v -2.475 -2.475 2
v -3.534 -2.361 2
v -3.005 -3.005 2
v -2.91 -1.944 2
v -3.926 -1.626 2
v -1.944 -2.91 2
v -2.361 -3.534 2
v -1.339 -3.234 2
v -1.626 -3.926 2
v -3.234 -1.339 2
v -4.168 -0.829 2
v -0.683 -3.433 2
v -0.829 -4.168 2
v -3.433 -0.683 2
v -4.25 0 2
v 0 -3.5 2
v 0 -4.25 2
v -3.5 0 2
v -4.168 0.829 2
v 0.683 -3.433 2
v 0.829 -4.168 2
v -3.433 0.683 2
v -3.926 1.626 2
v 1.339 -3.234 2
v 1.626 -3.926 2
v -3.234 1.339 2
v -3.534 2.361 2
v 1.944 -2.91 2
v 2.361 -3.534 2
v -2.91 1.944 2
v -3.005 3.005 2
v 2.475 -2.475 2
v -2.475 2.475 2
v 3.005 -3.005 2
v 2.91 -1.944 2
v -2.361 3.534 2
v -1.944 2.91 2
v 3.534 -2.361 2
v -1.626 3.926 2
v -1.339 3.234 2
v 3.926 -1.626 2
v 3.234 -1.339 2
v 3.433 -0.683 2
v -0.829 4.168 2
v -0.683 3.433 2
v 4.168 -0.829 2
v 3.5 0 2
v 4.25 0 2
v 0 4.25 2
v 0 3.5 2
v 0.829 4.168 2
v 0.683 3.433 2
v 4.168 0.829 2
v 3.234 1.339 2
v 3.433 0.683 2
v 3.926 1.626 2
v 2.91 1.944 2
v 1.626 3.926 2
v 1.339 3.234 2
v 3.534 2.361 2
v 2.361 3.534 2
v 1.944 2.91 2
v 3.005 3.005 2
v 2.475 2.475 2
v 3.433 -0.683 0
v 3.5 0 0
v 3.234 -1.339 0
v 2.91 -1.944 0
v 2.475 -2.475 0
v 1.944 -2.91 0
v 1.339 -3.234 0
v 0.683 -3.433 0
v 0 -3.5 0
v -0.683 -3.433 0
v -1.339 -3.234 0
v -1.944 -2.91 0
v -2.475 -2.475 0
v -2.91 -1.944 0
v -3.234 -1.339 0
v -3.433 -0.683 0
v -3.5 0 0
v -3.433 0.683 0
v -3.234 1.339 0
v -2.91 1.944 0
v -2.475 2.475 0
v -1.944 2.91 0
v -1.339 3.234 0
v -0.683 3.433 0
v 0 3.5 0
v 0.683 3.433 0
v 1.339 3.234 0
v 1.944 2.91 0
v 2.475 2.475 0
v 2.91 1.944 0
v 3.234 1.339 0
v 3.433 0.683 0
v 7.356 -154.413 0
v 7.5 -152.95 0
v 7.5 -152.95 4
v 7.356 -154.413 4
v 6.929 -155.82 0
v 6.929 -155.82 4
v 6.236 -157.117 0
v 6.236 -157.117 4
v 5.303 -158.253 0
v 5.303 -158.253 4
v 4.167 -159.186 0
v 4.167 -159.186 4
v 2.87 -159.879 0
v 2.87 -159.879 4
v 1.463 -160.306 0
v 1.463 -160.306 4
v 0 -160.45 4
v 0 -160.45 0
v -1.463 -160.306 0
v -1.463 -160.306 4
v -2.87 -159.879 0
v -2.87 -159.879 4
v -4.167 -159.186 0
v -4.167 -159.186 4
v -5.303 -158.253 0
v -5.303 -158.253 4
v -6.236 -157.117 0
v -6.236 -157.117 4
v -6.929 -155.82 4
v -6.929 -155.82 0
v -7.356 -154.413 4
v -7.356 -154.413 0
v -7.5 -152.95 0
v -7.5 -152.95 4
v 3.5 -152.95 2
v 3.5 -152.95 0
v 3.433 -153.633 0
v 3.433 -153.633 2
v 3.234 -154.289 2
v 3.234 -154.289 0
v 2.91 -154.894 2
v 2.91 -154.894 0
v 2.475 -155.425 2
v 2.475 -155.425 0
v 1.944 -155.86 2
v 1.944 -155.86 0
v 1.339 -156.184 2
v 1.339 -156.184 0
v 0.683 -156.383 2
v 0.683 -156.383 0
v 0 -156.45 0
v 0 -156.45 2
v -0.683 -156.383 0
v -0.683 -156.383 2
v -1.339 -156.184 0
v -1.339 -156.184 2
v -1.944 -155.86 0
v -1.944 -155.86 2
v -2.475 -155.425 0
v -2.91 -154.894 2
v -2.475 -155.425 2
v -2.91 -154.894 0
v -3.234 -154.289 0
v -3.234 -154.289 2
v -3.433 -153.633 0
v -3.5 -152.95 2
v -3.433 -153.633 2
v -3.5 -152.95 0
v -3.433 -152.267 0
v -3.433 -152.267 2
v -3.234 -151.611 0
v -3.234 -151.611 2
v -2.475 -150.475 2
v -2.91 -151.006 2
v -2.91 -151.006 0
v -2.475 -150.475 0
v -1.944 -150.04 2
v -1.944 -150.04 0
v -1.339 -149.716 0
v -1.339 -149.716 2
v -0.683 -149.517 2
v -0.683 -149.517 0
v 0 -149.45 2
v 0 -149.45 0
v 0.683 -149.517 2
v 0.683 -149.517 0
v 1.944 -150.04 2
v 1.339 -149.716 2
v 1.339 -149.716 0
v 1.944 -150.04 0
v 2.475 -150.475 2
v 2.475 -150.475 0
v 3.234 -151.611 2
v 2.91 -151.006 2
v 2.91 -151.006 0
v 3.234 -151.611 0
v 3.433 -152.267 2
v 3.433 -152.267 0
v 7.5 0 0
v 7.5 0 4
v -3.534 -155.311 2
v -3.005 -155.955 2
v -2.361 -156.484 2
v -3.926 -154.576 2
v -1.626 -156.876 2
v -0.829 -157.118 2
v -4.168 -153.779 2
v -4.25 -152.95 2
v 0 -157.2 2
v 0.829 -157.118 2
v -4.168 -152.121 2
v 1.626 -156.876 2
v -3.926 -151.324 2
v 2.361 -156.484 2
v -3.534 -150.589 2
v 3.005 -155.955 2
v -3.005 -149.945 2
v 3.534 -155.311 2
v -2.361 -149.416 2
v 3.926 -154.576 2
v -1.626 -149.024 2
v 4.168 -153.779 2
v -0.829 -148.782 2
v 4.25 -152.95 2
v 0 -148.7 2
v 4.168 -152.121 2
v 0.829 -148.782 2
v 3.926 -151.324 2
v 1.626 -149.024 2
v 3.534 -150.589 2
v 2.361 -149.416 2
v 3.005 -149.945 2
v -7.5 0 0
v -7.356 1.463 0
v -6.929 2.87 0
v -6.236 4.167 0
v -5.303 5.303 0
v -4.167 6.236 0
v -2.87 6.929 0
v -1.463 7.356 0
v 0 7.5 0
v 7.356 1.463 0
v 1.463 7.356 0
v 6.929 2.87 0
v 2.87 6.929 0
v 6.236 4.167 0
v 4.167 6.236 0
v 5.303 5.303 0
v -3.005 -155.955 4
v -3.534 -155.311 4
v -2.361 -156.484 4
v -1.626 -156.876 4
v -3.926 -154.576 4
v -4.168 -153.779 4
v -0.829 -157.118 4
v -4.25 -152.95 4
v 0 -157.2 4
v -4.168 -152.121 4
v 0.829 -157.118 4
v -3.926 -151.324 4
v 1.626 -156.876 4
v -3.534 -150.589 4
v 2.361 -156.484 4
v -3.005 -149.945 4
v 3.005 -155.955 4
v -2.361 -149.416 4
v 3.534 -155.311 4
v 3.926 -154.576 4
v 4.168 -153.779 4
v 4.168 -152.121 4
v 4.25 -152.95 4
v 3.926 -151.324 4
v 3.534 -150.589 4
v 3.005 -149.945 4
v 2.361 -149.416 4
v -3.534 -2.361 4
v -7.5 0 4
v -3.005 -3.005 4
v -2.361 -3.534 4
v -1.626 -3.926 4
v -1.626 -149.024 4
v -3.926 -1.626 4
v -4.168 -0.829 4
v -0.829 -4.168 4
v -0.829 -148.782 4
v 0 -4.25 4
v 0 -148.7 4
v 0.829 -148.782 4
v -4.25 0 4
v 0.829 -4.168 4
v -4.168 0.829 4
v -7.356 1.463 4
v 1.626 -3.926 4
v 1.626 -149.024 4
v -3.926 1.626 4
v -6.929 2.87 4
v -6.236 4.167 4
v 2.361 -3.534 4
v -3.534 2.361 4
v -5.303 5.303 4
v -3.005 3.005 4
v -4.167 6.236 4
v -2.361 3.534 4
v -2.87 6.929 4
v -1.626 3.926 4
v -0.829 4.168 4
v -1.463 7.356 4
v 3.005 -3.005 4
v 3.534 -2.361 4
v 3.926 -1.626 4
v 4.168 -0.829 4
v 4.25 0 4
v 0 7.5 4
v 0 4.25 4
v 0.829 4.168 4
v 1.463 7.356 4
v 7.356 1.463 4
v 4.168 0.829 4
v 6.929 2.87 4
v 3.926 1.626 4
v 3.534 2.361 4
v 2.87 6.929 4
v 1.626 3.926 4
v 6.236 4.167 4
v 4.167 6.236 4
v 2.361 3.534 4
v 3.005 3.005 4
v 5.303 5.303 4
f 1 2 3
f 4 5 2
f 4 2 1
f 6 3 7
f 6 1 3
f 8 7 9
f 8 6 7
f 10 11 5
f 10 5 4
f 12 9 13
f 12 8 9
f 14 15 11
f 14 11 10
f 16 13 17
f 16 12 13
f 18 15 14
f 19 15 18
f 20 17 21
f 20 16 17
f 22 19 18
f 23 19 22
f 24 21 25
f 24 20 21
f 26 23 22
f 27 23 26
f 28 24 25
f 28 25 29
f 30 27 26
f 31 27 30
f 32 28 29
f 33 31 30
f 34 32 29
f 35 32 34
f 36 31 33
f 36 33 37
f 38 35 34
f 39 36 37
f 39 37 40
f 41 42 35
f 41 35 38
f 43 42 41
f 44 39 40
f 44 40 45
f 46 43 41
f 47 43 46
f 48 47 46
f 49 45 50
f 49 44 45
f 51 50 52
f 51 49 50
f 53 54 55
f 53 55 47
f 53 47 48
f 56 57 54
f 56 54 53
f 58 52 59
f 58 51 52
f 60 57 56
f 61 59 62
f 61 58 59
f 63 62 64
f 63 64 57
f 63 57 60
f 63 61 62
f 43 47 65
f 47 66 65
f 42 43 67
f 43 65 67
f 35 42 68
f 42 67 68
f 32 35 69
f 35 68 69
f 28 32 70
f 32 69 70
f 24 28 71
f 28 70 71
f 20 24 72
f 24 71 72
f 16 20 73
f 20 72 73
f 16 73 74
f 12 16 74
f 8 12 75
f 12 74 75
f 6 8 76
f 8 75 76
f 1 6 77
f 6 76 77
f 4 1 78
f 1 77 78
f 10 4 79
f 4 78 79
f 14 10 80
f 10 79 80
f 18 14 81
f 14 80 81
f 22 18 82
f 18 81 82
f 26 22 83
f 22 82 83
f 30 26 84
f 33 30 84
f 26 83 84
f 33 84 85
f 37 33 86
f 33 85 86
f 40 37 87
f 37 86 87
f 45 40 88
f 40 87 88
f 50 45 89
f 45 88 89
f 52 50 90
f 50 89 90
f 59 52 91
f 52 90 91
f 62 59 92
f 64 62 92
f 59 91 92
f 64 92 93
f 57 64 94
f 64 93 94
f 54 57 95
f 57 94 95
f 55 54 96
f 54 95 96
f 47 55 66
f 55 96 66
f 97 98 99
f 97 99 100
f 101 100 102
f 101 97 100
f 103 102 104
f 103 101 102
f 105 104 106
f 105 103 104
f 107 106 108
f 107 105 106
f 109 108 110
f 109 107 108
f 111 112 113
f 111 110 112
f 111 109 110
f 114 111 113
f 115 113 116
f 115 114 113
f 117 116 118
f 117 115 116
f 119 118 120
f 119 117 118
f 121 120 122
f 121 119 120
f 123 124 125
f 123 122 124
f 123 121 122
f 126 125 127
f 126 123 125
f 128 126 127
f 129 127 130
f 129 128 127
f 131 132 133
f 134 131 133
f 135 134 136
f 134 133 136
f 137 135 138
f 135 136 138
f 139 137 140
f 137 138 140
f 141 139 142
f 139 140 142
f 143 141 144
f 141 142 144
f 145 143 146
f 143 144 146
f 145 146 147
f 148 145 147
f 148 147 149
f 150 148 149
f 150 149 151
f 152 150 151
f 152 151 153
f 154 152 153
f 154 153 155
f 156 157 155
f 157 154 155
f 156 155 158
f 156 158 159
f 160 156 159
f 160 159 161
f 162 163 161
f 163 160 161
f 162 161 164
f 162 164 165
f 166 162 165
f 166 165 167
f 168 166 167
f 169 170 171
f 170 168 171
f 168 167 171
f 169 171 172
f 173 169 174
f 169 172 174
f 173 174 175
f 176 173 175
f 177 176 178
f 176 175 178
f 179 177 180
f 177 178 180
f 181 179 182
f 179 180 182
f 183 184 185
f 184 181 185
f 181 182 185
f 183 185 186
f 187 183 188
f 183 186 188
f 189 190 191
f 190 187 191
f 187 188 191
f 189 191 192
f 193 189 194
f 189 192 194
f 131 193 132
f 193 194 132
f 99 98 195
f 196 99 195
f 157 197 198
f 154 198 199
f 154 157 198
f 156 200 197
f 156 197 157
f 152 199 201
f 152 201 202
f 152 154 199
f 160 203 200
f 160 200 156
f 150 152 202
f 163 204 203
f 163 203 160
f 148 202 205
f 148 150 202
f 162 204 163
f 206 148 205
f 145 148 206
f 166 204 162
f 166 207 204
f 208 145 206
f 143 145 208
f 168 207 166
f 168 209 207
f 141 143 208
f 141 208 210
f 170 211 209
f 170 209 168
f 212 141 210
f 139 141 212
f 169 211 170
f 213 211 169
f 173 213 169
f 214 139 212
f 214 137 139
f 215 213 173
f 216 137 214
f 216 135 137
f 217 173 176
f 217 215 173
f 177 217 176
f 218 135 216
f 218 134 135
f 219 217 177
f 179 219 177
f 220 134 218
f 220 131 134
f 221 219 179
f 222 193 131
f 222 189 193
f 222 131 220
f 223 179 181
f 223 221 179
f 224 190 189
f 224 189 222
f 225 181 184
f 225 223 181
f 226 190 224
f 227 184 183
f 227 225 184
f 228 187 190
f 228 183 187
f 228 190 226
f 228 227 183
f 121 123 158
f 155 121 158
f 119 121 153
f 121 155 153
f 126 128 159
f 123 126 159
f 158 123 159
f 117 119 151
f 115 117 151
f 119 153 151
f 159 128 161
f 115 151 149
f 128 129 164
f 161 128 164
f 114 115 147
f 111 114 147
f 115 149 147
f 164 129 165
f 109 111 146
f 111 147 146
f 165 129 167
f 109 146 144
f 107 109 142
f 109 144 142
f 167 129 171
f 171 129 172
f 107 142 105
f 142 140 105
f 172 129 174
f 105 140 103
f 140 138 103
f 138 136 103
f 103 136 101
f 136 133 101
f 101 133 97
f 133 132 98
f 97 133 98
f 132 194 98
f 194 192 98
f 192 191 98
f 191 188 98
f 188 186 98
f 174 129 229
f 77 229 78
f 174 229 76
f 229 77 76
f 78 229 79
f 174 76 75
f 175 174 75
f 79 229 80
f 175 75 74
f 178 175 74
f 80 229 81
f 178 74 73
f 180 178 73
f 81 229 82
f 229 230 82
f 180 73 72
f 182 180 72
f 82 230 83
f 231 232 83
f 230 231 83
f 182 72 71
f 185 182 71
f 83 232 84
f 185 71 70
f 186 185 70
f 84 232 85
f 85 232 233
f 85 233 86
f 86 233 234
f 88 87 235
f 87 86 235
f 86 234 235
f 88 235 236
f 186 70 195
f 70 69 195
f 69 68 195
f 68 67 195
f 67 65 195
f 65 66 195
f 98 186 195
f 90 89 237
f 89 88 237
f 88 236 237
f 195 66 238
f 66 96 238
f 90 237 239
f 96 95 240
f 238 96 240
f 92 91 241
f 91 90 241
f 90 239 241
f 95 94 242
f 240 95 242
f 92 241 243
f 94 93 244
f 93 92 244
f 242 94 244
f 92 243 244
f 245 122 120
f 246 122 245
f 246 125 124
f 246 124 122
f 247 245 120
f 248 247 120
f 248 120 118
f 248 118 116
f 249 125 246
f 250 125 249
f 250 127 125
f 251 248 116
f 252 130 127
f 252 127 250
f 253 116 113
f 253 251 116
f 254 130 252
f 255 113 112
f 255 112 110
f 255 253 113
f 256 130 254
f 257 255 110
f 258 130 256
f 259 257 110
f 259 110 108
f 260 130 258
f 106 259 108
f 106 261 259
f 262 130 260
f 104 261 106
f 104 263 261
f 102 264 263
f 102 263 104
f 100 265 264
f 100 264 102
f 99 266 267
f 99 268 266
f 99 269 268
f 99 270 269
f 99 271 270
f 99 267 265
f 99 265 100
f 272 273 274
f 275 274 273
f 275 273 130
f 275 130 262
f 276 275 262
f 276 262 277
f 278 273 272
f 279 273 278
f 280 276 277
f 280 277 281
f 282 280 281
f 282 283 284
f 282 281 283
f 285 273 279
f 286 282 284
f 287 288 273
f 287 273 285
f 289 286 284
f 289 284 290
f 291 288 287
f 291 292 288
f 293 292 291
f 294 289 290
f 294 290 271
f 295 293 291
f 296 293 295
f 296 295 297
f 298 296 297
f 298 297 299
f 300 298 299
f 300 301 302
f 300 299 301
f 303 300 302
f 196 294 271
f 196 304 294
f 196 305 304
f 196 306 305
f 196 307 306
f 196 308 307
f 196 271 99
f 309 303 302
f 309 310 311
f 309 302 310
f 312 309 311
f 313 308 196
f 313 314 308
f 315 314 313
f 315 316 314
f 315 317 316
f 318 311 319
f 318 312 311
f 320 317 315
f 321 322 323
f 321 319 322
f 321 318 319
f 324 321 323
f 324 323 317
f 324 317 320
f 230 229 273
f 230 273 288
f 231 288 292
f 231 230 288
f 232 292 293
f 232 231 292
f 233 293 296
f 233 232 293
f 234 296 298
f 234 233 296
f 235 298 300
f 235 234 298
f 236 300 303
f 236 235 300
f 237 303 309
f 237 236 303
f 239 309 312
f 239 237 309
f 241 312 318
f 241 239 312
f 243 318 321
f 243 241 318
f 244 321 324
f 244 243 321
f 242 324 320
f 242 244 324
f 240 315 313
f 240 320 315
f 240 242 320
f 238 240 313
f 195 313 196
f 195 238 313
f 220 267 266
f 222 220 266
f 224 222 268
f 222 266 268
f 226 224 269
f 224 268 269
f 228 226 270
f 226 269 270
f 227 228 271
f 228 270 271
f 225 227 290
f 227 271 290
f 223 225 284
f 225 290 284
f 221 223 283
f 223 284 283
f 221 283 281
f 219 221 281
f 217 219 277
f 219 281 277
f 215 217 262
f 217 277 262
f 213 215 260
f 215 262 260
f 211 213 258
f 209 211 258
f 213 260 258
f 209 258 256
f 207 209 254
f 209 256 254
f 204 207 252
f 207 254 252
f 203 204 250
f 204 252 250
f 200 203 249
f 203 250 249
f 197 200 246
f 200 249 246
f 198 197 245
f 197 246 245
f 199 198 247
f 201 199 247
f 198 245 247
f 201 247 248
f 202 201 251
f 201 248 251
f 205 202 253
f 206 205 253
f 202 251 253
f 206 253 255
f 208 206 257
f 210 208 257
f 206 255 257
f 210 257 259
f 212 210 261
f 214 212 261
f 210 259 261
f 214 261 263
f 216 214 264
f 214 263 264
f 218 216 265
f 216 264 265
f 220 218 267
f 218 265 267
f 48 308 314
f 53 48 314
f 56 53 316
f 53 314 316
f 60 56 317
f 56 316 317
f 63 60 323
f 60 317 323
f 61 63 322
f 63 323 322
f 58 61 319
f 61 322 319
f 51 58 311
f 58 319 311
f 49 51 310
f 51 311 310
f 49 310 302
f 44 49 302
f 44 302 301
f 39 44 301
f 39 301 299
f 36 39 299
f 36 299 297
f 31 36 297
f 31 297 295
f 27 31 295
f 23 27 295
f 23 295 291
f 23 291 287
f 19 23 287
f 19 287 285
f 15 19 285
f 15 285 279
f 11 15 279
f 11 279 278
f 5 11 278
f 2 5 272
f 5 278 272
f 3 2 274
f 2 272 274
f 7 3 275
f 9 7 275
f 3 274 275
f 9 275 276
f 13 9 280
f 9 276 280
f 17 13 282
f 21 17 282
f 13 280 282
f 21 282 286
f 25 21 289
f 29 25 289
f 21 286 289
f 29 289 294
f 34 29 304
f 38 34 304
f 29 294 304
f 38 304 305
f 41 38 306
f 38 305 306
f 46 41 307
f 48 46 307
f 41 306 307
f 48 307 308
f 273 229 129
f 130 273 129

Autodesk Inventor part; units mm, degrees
ref_plane "YZ Plane" through (0, 0, 0) normal (1, 0, 0) x (0, 1, 0)
ref_plane "XZ Plane" through (0, 0, 0) normal (0, 1, 0) x (-1, 0, 0)
ref_plane "XY Plane" through (0, 0, 0) normal (0, 0, 1) x (1, 0, 0)
sketch "スケッチ1" plane through (0, 0, 0) normal (0, 1, 0) x (-1, 0, 0)
  point P0 (0, 0)
sketch "スケッチ2" plane through (0, 0, 0) normal (0, 0, 1) x (1, 0, 0)
  circle A0 centre (0, 0) radius 3.5
  circle A1 centre (0, 0) radius 7.5
  line L0 (0, 0) -> (0, -152.95)
  circle A2 centre (0, -152.95) radius 3.5
  circle A3 centre (0, -152.95) radius 7.5
  line L1 (7.5, -152.95) -> (7.5, 0)
  line L2 (-7.5, 0) -> (-7.5, -152.95)
  dimension "d0" = 7
  dimension "d1" = 15
  dimension "d2" = 152.95
  dimension "d3" = 7
  dimension "d4" = 15
extrude "押し出し1" add sketch "スケッチ2" along normal blind 4
sketch "スケッチ4" plane through (0, 0, 4) normal (0, 0, 1) x (1, 0, 0)
  arc A0 (7.5, 0) -> (-7.5, 0) centre (0, 0) ccw projected
  circle A1 centre (0, 0) radius 4.25
  circle A2 centre (0, -152.95) radius 3.5 projected
  circle A3 centre (0, -152.95) radius 4.25
  dimension "d10" = 8.5
  dimension "d11" = 8.5
extrude "押し出し3" cut sketch "スケッチ4" against normal blind 2
properties part number "motor_holder_top"
